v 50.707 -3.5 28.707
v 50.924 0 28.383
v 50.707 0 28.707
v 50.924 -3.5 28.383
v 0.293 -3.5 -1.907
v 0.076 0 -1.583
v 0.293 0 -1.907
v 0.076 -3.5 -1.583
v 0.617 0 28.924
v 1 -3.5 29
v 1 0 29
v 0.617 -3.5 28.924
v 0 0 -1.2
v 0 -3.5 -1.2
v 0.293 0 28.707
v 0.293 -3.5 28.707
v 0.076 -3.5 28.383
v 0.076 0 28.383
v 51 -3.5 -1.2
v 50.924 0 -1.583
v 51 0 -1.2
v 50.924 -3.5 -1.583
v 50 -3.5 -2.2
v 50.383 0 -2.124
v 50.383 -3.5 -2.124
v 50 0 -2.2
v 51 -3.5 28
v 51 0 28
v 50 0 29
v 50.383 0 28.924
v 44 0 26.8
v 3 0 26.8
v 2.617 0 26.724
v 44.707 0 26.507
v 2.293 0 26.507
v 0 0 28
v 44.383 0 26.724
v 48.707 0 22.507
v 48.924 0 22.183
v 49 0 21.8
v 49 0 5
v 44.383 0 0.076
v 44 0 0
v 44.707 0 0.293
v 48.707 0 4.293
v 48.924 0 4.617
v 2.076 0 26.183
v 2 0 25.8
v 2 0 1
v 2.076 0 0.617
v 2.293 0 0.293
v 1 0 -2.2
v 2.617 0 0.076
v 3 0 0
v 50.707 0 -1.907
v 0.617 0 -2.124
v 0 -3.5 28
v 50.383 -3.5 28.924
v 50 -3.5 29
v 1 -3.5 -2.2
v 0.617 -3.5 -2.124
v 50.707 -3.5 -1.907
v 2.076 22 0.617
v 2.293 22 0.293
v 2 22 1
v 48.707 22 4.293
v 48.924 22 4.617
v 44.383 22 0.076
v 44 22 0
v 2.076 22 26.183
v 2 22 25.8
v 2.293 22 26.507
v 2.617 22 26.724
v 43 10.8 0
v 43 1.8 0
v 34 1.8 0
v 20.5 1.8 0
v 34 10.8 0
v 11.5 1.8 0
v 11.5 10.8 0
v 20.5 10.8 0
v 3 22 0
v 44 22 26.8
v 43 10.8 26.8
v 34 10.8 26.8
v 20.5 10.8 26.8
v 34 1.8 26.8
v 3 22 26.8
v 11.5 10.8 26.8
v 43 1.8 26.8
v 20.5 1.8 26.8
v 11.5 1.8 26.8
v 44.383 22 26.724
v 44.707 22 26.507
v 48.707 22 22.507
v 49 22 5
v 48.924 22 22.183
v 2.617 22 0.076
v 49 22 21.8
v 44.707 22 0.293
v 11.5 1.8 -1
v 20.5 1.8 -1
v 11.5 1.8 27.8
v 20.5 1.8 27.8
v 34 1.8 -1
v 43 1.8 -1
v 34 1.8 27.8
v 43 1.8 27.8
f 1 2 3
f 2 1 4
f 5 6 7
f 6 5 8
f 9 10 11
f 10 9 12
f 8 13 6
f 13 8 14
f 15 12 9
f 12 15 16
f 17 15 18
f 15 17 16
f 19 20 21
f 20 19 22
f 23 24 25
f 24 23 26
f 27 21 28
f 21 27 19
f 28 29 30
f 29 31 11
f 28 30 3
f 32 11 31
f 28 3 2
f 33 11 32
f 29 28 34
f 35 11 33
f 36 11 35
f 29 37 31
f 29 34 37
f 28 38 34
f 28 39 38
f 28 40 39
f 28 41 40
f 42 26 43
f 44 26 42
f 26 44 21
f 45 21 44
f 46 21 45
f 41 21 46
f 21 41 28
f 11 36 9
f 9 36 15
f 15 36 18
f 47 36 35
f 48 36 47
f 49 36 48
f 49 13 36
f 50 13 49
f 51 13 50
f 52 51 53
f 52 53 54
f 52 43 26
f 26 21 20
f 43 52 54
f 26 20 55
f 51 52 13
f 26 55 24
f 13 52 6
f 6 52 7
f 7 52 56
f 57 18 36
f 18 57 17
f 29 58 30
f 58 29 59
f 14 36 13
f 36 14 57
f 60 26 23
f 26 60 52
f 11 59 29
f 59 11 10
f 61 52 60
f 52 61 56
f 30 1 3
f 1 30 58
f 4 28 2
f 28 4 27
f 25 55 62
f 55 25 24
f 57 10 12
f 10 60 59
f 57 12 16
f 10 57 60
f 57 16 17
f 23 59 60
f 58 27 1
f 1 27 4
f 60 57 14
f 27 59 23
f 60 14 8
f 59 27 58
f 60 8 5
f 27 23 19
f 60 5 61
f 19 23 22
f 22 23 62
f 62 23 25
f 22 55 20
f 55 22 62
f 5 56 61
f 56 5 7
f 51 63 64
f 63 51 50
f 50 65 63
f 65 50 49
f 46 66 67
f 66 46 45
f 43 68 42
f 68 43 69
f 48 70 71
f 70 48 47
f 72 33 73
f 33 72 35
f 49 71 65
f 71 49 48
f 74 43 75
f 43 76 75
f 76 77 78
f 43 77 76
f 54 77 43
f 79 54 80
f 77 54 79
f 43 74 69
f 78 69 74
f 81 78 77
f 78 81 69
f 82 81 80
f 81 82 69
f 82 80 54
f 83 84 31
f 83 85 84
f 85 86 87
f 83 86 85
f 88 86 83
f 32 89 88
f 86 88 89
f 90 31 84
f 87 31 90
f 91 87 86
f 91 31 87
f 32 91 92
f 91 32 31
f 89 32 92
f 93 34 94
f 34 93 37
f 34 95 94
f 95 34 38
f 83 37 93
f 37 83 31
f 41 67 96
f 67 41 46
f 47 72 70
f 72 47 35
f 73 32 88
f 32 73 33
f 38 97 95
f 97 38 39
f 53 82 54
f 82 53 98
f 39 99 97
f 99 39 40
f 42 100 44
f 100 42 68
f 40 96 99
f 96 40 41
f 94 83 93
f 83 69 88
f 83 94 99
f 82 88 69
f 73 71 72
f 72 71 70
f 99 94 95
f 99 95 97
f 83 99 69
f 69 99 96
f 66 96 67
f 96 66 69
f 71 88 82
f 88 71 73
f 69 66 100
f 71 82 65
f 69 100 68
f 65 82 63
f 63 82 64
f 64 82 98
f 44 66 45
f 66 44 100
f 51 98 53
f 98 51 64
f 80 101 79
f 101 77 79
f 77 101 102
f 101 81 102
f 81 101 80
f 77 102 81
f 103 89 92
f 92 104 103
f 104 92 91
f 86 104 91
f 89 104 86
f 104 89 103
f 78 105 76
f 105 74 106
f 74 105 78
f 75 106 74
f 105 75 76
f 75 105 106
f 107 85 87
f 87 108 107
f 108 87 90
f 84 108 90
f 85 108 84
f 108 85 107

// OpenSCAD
e=0.001;

border_w=51;
border_h=31.2;
border_d=3.5;

w=47;
h=26.8;
d=22;
chamf=4;


flap_a_w=10;
flap_a_x=4;

flap_b_w=7;
flap_b_x=33;

flap_h=1;
flap_latch=.8;

corner=1;

module plug(margin=0, extra_depth=0)
{
	$fn=16;

	d = d+extra_depth;
	border_w = border_w-2*corner;
	border_h = border_h-2*corner;
	w = w-2*corner;
	h = h-2*corner;
	r = corner+margin;

	color([.3,.3,.3])
	translate([corner,0,corner])
	rotate([90,0,0])
	{
		translate([0,(h-border_h)/2,0])
		linear_extrude(border_d+margin)
		hull()
		for(p=[ [0, 0],
		        [0, border_h],
		        [border_w, border_h],
		        [border_w, 0]
		])
		translate(p)
		circle(r);

		translate([(border_w-w)/2,0,-d])
		linear_extrude(d+e)
		hull()
		for (p=[ [0, 0],
		         [0, h],
		         [w-chamf, h],
		         [w, h-chamf],
		         [w, chamf],
		         [w- chamf, 0],
		])
		translate(p)
		circle(r);
	}
}

module plug_latch(margin=0)
{
	rotate([90,0,0])
	rotate([0,90,0])
	linear_extrude(9)
	{
		polygon([ [0, -1], [0, 1+margin], [9, margin]]);
	}
}

module plug_latches(margin=0)
{
	for (x=[9.5,32])
	for (y_flip=[-1, 1])
	translate([(border_w-w)/2+x,1.8, h/2])
	scale([1,1,y_flip])
	translate([0,0,h/2])
	plug_latch(margin);
}

plug();

plug_latches()

%plug(margin=.3);
